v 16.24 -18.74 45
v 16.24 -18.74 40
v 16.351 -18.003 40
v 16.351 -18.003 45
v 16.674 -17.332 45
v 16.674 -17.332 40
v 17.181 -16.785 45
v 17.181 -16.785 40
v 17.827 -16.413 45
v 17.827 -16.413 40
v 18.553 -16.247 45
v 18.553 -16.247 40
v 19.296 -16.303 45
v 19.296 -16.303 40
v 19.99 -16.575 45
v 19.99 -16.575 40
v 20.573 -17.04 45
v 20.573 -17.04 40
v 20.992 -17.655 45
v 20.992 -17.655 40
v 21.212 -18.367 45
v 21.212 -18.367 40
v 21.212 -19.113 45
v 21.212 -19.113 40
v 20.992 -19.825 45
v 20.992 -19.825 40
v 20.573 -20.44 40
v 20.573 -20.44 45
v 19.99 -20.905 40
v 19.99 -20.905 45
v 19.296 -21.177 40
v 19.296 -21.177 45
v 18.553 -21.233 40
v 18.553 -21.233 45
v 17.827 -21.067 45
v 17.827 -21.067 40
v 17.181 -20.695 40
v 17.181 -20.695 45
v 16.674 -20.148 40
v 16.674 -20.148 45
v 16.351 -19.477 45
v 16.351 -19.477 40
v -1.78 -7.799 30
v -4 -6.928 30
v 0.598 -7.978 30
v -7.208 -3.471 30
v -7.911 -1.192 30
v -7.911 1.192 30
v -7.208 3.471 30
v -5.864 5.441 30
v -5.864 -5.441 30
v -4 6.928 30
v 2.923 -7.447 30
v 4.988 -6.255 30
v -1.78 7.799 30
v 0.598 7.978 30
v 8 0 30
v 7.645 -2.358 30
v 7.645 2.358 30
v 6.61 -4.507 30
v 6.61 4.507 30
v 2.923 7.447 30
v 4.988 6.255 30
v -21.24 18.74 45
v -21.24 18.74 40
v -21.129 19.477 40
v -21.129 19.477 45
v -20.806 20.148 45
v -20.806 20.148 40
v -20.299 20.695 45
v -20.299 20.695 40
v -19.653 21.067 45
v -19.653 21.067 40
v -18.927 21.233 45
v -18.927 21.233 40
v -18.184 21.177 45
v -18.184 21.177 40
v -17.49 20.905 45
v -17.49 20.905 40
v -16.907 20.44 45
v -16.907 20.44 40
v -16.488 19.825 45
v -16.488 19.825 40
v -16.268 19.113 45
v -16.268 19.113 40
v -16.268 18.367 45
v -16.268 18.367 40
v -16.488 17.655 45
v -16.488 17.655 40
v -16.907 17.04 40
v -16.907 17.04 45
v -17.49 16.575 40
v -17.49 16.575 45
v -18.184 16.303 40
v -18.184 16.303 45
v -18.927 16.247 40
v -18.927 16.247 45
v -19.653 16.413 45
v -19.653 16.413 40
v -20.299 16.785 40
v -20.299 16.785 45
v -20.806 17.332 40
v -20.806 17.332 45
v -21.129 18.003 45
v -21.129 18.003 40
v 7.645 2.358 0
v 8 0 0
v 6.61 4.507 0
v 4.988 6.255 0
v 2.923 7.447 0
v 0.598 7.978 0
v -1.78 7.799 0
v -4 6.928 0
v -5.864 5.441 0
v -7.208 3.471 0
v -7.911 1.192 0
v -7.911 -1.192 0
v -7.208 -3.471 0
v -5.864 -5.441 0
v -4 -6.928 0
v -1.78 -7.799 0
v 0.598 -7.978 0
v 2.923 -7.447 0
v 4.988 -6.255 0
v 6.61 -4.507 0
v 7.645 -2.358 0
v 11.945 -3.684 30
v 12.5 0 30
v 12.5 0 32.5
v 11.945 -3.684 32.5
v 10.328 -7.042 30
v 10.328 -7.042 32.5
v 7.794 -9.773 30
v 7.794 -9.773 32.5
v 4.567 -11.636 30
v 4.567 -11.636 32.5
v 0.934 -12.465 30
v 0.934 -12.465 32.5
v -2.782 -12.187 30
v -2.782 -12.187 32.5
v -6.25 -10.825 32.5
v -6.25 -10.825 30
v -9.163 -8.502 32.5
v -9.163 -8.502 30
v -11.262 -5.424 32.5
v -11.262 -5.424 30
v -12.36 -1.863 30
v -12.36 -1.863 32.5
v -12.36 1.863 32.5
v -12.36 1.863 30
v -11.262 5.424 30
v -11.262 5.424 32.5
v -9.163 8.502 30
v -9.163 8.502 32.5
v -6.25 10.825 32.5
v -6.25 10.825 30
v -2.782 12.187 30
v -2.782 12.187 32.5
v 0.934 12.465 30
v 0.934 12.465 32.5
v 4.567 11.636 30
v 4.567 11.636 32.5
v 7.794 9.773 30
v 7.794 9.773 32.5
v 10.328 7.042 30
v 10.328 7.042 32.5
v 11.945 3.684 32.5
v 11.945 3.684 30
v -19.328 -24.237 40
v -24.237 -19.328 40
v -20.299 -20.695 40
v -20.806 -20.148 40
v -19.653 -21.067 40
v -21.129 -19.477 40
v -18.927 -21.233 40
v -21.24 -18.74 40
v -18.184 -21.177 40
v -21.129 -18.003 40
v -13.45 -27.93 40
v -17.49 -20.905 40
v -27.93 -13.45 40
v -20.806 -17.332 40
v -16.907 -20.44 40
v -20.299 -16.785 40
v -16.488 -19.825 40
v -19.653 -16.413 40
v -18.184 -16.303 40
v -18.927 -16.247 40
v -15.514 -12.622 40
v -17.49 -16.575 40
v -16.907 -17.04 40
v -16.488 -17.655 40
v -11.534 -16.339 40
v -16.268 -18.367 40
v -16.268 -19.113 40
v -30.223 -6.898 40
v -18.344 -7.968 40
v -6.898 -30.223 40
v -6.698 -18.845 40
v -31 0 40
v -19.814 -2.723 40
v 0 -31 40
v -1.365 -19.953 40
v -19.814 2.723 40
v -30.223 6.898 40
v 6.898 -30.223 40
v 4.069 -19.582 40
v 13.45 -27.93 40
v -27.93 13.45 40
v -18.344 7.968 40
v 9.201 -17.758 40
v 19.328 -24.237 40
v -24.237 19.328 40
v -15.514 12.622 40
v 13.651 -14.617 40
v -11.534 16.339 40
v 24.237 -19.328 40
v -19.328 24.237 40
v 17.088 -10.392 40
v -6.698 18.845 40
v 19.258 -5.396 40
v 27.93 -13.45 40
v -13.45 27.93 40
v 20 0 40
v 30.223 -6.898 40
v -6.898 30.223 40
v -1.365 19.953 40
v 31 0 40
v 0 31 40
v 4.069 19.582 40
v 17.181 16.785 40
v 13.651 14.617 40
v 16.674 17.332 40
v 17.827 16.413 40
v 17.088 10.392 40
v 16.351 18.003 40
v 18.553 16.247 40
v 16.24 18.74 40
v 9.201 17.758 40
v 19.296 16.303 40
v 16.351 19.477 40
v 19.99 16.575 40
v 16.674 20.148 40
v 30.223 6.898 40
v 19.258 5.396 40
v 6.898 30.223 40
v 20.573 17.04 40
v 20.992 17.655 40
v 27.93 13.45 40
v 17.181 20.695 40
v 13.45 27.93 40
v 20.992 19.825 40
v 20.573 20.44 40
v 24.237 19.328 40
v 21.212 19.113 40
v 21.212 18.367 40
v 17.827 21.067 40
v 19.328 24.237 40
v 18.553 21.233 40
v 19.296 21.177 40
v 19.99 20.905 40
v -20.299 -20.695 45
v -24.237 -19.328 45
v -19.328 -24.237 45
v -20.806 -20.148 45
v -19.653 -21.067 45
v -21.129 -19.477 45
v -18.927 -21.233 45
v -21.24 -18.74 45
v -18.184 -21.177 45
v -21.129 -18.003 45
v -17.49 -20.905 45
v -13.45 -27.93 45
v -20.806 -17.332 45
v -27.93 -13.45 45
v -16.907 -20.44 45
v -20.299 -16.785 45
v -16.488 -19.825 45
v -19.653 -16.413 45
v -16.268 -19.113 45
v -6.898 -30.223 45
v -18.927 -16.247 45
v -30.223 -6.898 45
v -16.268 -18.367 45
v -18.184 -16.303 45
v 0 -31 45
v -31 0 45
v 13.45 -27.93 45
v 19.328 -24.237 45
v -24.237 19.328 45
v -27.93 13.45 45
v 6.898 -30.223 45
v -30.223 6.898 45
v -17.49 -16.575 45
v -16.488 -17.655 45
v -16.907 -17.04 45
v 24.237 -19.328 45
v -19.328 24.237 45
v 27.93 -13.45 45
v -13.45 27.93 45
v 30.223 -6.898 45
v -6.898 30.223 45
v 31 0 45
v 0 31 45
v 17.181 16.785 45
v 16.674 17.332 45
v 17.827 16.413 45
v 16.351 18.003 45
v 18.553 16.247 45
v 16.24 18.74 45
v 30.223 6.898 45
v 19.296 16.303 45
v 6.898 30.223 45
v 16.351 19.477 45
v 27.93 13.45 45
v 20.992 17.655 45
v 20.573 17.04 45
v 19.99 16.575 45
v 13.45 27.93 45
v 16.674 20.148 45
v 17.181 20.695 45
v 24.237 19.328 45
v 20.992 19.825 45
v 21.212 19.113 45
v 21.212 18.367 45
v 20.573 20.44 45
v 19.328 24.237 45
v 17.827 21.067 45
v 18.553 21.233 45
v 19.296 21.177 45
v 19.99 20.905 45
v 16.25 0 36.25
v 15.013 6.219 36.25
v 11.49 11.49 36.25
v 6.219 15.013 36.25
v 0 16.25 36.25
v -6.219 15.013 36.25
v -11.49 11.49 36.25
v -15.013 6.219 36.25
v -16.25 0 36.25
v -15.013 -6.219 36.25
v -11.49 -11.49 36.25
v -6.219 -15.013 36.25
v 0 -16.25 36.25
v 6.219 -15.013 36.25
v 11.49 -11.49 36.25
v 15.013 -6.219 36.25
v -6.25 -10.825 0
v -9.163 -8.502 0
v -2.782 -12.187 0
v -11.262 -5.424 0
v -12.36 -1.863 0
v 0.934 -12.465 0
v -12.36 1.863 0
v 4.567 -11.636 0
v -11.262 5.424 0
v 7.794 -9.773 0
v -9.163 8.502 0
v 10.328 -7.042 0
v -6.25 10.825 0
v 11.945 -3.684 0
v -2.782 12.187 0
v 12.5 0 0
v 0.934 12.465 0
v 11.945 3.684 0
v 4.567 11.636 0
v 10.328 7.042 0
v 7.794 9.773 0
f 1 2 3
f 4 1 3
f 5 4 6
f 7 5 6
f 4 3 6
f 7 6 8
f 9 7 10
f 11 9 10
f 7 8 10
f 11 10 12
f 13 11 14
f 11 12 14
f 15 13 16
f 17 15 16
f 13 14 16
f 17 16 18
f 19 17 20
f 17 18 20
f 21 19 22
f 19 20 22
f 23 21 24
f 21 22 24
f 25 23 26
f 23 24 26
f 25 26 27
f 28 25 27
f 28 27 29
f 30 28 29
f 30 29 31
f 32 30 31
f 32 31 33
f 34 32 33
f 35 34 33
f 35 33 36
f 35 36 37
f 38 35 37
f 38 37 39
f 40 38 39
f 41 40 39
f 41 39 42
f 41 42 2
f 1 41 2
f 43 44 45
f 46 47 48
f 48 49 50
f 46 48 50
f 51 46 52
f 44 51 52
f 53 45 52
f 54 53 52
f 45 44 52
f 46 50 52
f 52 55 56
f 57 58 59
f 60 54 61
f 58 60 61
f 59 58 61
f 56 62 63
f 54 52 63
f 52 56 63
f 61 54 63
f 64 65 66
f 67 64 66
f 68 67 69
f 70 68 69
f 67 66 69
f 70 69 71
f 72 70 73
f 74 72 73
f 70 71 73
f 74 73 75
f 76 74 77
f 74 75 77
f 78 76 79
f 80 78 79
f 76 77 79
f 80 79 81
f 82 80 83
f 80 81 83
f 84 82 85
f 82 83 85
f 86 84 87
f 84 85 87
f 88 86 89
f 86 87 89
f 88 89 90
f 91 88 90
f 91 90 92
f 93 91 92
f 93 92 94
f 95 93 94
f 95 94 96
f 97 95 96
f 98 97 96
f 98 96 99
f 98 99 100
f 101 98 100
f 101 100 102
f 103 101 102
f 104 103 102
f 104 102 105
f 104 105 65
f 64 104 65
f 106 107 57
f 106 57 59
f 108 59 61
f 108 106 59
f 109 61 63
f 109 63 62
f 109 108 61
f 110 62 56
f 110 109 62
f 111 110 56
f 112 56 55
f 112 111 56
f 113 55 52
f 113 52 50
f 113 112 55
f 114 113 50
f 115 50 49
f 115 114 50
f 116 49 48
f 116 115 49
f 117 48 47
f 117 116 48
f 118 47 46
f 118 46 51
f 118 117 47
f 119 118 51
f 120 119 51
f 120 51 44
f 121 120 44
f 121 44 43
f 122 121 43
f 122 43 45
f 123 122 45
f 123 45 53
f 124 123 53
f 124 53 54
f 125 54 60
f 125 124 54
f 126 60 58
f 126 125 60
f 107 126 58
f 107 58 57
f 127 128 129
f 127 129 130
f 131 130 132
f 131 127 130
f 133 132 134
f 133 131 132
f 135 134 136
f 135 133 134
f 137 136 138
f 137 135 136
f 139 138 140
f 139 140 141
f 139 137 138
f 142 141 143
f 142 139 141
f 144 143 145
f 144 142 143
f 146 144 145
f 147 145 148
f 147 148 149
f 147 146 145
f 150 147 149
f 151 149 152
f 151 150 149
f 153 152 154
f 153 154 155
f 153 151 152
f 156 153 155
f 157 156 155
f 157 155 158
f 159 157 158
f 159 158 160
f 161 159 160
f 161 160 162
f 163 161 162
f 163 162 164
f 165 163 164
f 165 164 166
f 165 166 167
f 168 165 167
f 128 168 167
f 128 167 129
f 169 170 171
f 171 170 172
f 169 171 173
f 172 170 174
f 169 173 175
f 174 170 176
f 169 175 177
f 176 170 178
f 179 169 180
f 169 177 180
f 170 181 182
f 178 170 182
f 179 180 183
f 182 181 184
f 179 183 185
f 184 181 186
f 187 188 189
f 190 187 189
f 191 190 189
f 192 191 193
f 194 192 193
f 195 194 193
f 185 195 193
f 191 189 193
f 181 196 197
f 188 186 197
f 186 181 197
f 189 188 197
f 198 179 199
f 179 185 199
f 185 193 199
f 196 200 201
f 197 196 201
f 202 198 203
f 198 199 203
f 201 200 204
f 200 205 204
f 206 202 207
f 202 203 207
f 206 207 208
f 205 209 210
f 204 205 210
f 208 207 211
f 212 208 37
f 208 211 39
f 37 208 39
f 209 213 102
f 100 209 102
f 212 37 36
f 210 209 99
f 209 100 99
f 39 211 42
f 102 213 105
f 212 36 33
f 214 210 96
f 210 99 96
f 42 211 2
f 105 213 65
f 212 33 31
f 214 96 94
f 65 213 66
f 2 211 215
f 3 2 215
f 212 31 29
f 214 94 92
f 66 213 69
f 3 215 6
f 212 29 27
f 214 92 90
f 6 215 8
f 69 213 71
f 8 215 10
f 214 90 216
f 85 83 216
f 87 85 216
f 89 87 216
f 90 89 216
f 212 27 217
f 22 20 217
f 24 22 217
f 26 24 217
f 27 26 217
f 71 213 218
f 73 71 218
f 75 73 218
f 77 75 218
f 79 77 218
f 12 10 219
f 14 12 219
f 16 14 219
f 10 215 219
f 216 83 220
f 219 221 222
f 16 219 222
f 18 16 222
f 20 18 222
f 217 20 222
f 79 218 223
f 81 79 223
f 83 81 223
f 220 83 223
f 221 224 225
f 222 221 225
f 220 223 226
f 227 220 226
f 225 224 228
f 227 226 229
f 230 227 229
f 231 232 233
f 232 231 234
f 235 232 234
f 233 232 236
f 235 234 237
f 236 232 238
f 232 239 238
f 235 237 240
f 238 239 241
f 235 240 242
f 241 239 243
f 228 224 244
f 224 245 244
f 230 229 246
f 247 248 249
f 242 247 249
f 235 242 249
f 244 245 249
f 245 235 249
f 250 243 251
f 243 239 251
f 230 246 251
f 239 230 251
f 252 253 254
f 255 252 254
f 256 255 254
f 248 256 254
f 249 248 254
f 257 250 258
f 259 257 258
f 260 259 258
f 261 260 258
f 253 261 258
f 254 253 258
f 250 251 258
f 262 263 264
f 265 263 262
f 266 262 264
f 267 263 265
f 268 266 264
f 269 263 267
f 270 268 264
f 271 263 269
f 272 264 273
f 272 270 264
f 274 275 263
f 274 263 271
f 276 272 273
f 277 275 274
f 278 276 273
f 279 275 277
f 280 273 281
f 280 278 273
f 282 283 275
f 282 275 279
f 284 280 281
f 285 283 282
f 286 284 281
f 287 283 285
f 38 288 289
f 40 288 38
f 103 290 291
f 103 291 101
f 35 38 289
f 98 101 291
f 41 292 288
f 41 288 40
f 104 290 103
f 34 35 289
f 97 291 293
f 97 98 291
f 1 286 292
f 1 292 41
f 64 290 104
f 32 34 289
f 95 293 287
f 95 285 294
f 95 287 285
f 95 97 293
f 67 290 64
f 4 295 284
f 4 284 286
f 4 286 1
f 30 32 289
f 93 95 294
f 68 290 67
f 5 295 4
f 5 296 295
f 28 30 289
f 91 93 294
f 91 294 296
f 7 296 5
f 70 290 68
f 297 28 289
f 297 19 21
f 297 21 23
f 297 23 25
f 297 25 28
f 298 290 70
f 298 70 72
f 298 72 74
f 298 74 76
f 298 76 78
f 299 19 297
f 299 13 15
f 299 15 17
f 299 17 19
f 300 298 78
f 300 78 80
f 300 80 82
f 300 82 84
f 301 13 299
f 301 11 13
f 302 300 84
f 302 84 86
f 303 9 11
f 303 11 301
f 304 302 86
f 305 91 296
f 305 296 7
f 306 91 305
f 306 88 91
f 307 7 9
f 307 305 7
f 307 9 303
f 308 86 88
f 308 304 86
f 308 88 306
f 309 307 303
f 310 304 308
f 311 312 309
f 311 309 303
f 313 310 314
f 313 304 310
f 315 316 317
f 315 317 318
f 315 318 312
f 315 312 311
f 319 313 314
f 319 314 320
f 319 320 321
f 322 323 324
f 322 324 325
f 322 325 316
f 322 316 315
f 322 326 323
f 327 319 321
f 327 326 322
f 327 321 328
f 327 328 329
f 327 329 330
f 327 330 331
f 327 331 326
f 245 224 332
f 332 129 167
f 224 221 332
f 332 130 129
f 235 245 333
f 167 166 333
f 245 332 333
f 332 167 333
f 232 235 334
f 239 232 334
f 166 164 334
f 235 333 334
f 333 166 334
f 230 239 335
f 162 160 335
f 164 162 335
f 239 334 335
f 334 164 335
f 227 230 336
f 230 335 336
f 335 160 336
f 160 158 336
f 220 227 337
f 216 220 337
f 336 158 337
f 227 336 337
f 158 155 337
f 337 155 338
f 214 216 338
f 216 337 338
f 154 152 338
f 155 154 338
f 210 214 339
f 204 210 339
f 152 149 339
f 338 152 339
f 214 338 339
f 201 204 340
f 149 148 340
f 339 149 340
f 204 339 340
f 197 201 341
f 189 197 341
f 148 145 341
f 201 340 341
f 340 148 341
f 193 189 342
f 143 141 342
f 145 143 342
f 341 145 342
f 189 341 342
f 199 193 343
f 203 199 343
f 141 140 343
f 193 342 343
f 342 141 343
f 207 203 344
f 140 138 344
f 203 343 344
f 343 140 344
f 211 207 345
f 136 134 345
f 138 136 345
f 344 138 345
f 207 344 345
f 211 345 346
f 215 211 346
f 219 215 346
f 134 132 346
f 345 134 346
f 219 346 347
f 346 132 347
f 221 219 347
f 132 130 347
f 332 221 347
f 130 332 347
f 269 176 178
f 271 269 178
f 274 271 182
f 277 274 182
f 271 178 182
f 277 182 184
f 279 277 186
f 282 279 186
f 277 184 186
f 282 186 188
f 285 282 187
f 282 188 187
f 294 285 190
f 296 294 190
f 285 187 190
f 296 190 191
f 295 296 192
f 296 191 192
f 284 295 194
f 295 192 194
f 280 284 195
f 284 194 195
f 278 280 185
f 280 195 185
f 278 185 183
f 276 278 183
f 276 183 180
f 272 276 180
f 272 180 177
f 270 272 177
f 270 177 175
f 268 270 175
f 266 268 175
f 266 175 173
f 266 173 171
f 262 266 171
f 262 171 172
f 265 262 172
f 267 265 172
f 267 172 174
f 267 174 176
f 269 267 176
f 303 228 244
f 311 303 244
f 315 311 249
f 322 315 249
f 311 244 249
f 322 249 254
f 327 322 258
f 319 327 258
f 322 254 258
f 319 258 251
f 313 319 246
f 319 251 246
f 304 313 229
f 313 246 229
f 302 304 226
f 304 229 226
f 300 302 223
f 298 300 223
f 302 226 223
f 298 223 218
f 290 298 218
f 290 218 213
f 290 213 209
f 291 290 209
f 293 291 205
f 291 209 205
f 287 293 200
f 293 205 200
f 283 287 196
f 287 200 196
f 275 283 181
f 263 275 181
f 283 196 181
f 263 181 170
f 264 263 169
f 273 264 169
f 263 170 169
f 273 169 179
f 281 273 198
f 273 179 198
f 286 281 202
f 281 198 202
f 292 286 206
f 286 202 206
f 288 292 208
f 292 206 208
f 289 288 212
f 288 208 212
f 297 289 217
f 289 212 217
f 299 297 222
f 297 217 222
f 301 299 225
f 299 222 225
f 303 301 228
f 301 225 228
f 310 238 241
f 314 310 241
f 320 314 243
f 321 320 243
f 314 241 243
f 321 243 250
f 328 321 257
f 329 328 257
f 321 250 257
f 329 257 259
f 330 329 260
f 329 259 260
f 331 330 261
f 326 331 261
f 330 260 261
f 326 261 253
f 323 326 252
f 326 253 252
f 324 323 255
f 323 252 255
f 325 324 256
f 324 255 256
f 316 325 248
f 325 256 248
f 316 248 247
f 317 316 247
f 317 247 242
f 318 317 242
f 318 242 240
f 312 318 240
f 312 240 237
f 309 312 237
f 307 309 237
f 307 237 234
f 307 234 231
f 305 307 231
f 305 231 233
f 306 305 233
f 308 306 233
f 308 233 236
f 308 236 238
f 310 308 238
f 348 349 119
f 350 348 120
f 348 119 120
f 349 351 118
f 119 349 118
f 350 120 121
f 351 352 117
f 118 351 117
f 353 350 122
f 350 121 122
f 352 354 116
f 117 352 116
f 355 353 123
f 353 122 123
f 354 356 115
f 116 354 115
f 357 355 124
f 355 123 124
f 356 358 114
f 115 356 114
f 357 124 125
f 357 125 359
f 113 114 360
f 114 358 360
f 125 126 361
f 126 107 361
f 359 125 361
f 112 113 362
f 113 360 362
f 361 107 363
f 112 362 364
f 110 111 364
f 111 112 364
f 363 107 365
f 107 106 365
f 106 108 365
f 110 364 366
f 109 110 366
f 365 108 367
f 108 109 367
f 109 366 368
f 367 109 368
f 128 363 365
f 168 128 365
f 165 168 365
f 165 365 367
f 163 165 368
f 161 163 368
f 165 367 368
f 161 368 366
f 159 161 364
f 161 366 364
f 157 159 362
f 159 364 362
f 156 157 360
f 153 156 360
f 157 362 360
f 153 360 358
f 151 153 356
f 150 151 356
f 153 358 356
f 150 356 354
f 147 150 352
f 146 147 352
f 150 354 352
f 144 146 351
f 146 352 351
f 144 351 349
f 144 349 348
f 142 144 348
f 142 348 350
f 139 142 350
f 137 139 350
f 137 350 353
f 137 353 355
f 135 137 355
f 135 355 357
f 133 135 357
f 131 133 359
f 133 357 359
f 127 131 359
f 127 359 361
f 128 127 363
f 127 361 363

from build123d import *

# Parameters (mm, degrees)
SZKIC1_R                    = 12.5
SZKIC1_R_2                  = 8
DODANIE_WYCI_GNI_CIE1_DEPTH = 30
SZKIC2_R                    = 20
DODANIE_WYCI_GNI_CIE3_DEPTH = 10
SZKIC3_R                    = 31
DODANIE_WYCI_GNI_CIE4_DEPTH = 5
SFAZOWANIE1_SIZE            = 10
OTWORY_USTALAJ_CE_5_0MM1_D  = 5


with BuildPart() as part:
    # Szkic1 → Dodanie-wyciągnięcie1 (new body)
    with BuildSketch(Plane.XY):
        Circle(SZKIC1_R)
        Circle(SZKIC1_R_2, mode=Mode.SUBTRACT)
    extrude(amount=DODANIE_WYCI_GNI_CIE1_DEPTH)

    # Szkic2 → Dodanie-wyciągnięcie3 (add)
    with BuildSketch(Plane.XY.offset(30)):
        Circle(SZKIC2_R)
    extrude(amount=DODANIE_WYCI_GNI_CIE3_DEPTH)

    # Szkic3 → Dodanie-wyciągnięcie4 (add)
    with BuildSketch(Plane.XY.offset(40)):
        Circle(SZKIC3_R)
    extrude(amount=DODANIE_WYCI_GNI_CIE4_DEPTH)

    # Sfazowanie1
    # the kernel refuses this chamfer: 10 mm, written as the material it takes off along each edge
    with BuildSketch(Plane(origin=(0, 0, 30), x_dir=(1, 0, 0), z_dir=(0, -1, 0))) as sfazowanie1_piece_1_section:
        Polygon((20, SFAZOWANIE1_SIZE), (20 - SFAZOWANIE1_SIZE, 0), (20, 0), align=None)
    sfazowanie1_piece_1 = revolve(axis=Axis((0, 0, 30), (0, 0, 1)), mode=Mode.PRIVATE)
    sfazowanie1_piece_1 = split(sfazowanie1_piece_1, bisect_by=Plane(origin=(-16.374530577, 0, 40), z_dir=(0, 0, -1)), keep=Keep.TOP, mode=Mode.PRIVATE)
    sfazowanie1_piece_1 = sfazowanie1_piece_1 - Plane(origin=(0, 0, 36.125469423), x_dir=(1, 0, 0), z_dir=(0, 0, -1)) * Cylinder(12.5, 80, mode=Mode.PRIVATE)
    add(sfazowanie1_piece_1, mode=Mode.SUBTRACT)

    # Otwory ustalające Ø5.0mm1 (through all)
    with Locations(Plane(origin=(-18.74, 18.74, 45), x_dir=(1, 0, 0), z_dir=(0, 0, 1))):
        with Locations((0, 0), (37.48, 0), (37.48, -37.48), (0, -37.48)):
            Hole(OTWORY_USTALAJ_CE_5_0MM1_D / 2)


solid = part.part
